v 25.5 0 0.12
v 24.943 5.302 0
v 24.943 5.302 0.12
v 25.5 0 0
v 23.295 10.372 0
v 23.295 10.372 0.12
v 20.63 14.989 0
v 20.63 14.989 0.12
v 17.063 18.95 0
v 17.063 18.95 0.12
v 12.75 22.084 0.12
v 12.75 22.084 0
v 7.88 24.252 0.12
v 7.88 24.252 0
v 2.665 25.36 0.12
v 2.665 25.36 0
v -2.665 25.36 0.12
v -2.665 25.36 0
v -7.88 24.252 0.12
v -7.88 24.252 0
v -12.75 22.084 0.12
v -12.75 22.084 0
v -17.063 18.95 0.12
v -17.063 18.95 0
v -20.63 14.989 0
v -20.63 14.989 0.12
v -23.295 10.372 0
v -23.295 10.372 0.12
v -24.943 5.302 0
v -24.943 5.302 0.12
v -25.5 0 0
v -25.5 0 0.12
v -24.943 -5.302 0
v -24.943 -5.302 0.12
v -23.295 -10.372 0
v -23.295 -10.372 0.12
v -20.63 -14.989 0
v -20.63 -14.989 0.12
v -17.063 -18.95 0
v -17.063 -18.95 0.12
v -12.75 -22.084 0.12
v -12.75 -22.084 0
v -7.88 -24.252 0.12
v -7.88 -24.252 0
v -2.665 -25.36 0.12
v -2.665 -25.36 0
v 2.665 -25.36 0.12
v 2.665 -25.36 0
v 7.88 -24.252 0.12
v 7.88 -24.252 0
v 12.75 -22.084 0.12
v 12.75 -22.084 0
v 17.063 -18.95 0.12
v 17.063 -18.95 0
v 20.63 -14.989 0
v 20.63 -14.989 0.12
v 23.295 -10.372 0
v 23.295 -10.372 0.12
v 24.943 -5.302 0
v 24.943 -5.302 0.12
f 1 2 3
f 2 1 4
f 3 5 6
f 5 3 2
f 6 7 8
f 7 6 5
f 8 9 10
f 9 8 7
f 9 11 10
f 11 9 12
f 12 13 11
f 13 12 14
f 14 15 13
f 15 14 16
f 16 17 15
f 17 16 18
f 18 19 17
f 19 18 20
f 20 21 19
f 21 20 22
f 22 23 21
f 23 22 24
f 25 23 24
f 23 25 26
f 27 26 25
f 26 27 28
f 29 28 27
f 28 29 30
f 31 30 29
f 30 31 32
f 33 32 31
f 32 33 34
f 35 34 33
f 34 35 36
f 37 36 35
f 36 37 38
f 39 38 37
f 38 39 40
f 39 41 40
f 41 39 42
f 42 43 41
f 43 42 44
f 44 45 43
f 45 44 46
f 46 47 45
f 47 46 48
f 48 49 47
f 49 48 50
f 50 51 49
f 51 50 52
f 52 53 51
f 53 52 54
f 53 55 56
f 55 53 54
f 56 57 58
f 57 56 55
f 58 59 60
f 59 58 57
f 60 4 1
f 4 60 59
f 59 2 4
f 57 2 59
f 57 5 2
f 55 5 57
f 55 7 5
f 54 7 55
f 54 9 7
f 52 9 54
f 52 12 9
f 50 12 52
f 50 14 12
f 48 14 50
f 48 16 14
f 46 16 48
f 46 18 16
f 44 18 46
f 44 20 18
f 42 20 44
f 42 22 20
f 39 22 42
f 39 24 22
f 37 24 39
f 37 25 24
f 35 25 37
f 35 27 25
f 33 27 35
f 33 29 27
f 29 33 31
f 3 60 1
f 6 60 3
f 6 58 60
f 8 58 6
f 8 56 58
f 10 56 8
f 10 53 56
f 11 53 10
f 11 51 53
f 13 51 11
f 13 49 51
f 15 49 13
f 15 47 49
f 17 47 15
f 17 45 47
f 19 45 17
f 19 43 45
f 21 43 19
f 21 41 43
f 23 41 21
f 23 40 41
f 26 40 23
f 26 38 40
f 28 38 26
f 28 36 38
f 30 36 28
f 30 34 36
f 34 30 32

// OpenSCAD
goggle_glass_r = 25.5;
goggle_glass_h = .12;

$FN = 180;

cylinder(h = goggle_glass_h, r = goggle_glass_r);
